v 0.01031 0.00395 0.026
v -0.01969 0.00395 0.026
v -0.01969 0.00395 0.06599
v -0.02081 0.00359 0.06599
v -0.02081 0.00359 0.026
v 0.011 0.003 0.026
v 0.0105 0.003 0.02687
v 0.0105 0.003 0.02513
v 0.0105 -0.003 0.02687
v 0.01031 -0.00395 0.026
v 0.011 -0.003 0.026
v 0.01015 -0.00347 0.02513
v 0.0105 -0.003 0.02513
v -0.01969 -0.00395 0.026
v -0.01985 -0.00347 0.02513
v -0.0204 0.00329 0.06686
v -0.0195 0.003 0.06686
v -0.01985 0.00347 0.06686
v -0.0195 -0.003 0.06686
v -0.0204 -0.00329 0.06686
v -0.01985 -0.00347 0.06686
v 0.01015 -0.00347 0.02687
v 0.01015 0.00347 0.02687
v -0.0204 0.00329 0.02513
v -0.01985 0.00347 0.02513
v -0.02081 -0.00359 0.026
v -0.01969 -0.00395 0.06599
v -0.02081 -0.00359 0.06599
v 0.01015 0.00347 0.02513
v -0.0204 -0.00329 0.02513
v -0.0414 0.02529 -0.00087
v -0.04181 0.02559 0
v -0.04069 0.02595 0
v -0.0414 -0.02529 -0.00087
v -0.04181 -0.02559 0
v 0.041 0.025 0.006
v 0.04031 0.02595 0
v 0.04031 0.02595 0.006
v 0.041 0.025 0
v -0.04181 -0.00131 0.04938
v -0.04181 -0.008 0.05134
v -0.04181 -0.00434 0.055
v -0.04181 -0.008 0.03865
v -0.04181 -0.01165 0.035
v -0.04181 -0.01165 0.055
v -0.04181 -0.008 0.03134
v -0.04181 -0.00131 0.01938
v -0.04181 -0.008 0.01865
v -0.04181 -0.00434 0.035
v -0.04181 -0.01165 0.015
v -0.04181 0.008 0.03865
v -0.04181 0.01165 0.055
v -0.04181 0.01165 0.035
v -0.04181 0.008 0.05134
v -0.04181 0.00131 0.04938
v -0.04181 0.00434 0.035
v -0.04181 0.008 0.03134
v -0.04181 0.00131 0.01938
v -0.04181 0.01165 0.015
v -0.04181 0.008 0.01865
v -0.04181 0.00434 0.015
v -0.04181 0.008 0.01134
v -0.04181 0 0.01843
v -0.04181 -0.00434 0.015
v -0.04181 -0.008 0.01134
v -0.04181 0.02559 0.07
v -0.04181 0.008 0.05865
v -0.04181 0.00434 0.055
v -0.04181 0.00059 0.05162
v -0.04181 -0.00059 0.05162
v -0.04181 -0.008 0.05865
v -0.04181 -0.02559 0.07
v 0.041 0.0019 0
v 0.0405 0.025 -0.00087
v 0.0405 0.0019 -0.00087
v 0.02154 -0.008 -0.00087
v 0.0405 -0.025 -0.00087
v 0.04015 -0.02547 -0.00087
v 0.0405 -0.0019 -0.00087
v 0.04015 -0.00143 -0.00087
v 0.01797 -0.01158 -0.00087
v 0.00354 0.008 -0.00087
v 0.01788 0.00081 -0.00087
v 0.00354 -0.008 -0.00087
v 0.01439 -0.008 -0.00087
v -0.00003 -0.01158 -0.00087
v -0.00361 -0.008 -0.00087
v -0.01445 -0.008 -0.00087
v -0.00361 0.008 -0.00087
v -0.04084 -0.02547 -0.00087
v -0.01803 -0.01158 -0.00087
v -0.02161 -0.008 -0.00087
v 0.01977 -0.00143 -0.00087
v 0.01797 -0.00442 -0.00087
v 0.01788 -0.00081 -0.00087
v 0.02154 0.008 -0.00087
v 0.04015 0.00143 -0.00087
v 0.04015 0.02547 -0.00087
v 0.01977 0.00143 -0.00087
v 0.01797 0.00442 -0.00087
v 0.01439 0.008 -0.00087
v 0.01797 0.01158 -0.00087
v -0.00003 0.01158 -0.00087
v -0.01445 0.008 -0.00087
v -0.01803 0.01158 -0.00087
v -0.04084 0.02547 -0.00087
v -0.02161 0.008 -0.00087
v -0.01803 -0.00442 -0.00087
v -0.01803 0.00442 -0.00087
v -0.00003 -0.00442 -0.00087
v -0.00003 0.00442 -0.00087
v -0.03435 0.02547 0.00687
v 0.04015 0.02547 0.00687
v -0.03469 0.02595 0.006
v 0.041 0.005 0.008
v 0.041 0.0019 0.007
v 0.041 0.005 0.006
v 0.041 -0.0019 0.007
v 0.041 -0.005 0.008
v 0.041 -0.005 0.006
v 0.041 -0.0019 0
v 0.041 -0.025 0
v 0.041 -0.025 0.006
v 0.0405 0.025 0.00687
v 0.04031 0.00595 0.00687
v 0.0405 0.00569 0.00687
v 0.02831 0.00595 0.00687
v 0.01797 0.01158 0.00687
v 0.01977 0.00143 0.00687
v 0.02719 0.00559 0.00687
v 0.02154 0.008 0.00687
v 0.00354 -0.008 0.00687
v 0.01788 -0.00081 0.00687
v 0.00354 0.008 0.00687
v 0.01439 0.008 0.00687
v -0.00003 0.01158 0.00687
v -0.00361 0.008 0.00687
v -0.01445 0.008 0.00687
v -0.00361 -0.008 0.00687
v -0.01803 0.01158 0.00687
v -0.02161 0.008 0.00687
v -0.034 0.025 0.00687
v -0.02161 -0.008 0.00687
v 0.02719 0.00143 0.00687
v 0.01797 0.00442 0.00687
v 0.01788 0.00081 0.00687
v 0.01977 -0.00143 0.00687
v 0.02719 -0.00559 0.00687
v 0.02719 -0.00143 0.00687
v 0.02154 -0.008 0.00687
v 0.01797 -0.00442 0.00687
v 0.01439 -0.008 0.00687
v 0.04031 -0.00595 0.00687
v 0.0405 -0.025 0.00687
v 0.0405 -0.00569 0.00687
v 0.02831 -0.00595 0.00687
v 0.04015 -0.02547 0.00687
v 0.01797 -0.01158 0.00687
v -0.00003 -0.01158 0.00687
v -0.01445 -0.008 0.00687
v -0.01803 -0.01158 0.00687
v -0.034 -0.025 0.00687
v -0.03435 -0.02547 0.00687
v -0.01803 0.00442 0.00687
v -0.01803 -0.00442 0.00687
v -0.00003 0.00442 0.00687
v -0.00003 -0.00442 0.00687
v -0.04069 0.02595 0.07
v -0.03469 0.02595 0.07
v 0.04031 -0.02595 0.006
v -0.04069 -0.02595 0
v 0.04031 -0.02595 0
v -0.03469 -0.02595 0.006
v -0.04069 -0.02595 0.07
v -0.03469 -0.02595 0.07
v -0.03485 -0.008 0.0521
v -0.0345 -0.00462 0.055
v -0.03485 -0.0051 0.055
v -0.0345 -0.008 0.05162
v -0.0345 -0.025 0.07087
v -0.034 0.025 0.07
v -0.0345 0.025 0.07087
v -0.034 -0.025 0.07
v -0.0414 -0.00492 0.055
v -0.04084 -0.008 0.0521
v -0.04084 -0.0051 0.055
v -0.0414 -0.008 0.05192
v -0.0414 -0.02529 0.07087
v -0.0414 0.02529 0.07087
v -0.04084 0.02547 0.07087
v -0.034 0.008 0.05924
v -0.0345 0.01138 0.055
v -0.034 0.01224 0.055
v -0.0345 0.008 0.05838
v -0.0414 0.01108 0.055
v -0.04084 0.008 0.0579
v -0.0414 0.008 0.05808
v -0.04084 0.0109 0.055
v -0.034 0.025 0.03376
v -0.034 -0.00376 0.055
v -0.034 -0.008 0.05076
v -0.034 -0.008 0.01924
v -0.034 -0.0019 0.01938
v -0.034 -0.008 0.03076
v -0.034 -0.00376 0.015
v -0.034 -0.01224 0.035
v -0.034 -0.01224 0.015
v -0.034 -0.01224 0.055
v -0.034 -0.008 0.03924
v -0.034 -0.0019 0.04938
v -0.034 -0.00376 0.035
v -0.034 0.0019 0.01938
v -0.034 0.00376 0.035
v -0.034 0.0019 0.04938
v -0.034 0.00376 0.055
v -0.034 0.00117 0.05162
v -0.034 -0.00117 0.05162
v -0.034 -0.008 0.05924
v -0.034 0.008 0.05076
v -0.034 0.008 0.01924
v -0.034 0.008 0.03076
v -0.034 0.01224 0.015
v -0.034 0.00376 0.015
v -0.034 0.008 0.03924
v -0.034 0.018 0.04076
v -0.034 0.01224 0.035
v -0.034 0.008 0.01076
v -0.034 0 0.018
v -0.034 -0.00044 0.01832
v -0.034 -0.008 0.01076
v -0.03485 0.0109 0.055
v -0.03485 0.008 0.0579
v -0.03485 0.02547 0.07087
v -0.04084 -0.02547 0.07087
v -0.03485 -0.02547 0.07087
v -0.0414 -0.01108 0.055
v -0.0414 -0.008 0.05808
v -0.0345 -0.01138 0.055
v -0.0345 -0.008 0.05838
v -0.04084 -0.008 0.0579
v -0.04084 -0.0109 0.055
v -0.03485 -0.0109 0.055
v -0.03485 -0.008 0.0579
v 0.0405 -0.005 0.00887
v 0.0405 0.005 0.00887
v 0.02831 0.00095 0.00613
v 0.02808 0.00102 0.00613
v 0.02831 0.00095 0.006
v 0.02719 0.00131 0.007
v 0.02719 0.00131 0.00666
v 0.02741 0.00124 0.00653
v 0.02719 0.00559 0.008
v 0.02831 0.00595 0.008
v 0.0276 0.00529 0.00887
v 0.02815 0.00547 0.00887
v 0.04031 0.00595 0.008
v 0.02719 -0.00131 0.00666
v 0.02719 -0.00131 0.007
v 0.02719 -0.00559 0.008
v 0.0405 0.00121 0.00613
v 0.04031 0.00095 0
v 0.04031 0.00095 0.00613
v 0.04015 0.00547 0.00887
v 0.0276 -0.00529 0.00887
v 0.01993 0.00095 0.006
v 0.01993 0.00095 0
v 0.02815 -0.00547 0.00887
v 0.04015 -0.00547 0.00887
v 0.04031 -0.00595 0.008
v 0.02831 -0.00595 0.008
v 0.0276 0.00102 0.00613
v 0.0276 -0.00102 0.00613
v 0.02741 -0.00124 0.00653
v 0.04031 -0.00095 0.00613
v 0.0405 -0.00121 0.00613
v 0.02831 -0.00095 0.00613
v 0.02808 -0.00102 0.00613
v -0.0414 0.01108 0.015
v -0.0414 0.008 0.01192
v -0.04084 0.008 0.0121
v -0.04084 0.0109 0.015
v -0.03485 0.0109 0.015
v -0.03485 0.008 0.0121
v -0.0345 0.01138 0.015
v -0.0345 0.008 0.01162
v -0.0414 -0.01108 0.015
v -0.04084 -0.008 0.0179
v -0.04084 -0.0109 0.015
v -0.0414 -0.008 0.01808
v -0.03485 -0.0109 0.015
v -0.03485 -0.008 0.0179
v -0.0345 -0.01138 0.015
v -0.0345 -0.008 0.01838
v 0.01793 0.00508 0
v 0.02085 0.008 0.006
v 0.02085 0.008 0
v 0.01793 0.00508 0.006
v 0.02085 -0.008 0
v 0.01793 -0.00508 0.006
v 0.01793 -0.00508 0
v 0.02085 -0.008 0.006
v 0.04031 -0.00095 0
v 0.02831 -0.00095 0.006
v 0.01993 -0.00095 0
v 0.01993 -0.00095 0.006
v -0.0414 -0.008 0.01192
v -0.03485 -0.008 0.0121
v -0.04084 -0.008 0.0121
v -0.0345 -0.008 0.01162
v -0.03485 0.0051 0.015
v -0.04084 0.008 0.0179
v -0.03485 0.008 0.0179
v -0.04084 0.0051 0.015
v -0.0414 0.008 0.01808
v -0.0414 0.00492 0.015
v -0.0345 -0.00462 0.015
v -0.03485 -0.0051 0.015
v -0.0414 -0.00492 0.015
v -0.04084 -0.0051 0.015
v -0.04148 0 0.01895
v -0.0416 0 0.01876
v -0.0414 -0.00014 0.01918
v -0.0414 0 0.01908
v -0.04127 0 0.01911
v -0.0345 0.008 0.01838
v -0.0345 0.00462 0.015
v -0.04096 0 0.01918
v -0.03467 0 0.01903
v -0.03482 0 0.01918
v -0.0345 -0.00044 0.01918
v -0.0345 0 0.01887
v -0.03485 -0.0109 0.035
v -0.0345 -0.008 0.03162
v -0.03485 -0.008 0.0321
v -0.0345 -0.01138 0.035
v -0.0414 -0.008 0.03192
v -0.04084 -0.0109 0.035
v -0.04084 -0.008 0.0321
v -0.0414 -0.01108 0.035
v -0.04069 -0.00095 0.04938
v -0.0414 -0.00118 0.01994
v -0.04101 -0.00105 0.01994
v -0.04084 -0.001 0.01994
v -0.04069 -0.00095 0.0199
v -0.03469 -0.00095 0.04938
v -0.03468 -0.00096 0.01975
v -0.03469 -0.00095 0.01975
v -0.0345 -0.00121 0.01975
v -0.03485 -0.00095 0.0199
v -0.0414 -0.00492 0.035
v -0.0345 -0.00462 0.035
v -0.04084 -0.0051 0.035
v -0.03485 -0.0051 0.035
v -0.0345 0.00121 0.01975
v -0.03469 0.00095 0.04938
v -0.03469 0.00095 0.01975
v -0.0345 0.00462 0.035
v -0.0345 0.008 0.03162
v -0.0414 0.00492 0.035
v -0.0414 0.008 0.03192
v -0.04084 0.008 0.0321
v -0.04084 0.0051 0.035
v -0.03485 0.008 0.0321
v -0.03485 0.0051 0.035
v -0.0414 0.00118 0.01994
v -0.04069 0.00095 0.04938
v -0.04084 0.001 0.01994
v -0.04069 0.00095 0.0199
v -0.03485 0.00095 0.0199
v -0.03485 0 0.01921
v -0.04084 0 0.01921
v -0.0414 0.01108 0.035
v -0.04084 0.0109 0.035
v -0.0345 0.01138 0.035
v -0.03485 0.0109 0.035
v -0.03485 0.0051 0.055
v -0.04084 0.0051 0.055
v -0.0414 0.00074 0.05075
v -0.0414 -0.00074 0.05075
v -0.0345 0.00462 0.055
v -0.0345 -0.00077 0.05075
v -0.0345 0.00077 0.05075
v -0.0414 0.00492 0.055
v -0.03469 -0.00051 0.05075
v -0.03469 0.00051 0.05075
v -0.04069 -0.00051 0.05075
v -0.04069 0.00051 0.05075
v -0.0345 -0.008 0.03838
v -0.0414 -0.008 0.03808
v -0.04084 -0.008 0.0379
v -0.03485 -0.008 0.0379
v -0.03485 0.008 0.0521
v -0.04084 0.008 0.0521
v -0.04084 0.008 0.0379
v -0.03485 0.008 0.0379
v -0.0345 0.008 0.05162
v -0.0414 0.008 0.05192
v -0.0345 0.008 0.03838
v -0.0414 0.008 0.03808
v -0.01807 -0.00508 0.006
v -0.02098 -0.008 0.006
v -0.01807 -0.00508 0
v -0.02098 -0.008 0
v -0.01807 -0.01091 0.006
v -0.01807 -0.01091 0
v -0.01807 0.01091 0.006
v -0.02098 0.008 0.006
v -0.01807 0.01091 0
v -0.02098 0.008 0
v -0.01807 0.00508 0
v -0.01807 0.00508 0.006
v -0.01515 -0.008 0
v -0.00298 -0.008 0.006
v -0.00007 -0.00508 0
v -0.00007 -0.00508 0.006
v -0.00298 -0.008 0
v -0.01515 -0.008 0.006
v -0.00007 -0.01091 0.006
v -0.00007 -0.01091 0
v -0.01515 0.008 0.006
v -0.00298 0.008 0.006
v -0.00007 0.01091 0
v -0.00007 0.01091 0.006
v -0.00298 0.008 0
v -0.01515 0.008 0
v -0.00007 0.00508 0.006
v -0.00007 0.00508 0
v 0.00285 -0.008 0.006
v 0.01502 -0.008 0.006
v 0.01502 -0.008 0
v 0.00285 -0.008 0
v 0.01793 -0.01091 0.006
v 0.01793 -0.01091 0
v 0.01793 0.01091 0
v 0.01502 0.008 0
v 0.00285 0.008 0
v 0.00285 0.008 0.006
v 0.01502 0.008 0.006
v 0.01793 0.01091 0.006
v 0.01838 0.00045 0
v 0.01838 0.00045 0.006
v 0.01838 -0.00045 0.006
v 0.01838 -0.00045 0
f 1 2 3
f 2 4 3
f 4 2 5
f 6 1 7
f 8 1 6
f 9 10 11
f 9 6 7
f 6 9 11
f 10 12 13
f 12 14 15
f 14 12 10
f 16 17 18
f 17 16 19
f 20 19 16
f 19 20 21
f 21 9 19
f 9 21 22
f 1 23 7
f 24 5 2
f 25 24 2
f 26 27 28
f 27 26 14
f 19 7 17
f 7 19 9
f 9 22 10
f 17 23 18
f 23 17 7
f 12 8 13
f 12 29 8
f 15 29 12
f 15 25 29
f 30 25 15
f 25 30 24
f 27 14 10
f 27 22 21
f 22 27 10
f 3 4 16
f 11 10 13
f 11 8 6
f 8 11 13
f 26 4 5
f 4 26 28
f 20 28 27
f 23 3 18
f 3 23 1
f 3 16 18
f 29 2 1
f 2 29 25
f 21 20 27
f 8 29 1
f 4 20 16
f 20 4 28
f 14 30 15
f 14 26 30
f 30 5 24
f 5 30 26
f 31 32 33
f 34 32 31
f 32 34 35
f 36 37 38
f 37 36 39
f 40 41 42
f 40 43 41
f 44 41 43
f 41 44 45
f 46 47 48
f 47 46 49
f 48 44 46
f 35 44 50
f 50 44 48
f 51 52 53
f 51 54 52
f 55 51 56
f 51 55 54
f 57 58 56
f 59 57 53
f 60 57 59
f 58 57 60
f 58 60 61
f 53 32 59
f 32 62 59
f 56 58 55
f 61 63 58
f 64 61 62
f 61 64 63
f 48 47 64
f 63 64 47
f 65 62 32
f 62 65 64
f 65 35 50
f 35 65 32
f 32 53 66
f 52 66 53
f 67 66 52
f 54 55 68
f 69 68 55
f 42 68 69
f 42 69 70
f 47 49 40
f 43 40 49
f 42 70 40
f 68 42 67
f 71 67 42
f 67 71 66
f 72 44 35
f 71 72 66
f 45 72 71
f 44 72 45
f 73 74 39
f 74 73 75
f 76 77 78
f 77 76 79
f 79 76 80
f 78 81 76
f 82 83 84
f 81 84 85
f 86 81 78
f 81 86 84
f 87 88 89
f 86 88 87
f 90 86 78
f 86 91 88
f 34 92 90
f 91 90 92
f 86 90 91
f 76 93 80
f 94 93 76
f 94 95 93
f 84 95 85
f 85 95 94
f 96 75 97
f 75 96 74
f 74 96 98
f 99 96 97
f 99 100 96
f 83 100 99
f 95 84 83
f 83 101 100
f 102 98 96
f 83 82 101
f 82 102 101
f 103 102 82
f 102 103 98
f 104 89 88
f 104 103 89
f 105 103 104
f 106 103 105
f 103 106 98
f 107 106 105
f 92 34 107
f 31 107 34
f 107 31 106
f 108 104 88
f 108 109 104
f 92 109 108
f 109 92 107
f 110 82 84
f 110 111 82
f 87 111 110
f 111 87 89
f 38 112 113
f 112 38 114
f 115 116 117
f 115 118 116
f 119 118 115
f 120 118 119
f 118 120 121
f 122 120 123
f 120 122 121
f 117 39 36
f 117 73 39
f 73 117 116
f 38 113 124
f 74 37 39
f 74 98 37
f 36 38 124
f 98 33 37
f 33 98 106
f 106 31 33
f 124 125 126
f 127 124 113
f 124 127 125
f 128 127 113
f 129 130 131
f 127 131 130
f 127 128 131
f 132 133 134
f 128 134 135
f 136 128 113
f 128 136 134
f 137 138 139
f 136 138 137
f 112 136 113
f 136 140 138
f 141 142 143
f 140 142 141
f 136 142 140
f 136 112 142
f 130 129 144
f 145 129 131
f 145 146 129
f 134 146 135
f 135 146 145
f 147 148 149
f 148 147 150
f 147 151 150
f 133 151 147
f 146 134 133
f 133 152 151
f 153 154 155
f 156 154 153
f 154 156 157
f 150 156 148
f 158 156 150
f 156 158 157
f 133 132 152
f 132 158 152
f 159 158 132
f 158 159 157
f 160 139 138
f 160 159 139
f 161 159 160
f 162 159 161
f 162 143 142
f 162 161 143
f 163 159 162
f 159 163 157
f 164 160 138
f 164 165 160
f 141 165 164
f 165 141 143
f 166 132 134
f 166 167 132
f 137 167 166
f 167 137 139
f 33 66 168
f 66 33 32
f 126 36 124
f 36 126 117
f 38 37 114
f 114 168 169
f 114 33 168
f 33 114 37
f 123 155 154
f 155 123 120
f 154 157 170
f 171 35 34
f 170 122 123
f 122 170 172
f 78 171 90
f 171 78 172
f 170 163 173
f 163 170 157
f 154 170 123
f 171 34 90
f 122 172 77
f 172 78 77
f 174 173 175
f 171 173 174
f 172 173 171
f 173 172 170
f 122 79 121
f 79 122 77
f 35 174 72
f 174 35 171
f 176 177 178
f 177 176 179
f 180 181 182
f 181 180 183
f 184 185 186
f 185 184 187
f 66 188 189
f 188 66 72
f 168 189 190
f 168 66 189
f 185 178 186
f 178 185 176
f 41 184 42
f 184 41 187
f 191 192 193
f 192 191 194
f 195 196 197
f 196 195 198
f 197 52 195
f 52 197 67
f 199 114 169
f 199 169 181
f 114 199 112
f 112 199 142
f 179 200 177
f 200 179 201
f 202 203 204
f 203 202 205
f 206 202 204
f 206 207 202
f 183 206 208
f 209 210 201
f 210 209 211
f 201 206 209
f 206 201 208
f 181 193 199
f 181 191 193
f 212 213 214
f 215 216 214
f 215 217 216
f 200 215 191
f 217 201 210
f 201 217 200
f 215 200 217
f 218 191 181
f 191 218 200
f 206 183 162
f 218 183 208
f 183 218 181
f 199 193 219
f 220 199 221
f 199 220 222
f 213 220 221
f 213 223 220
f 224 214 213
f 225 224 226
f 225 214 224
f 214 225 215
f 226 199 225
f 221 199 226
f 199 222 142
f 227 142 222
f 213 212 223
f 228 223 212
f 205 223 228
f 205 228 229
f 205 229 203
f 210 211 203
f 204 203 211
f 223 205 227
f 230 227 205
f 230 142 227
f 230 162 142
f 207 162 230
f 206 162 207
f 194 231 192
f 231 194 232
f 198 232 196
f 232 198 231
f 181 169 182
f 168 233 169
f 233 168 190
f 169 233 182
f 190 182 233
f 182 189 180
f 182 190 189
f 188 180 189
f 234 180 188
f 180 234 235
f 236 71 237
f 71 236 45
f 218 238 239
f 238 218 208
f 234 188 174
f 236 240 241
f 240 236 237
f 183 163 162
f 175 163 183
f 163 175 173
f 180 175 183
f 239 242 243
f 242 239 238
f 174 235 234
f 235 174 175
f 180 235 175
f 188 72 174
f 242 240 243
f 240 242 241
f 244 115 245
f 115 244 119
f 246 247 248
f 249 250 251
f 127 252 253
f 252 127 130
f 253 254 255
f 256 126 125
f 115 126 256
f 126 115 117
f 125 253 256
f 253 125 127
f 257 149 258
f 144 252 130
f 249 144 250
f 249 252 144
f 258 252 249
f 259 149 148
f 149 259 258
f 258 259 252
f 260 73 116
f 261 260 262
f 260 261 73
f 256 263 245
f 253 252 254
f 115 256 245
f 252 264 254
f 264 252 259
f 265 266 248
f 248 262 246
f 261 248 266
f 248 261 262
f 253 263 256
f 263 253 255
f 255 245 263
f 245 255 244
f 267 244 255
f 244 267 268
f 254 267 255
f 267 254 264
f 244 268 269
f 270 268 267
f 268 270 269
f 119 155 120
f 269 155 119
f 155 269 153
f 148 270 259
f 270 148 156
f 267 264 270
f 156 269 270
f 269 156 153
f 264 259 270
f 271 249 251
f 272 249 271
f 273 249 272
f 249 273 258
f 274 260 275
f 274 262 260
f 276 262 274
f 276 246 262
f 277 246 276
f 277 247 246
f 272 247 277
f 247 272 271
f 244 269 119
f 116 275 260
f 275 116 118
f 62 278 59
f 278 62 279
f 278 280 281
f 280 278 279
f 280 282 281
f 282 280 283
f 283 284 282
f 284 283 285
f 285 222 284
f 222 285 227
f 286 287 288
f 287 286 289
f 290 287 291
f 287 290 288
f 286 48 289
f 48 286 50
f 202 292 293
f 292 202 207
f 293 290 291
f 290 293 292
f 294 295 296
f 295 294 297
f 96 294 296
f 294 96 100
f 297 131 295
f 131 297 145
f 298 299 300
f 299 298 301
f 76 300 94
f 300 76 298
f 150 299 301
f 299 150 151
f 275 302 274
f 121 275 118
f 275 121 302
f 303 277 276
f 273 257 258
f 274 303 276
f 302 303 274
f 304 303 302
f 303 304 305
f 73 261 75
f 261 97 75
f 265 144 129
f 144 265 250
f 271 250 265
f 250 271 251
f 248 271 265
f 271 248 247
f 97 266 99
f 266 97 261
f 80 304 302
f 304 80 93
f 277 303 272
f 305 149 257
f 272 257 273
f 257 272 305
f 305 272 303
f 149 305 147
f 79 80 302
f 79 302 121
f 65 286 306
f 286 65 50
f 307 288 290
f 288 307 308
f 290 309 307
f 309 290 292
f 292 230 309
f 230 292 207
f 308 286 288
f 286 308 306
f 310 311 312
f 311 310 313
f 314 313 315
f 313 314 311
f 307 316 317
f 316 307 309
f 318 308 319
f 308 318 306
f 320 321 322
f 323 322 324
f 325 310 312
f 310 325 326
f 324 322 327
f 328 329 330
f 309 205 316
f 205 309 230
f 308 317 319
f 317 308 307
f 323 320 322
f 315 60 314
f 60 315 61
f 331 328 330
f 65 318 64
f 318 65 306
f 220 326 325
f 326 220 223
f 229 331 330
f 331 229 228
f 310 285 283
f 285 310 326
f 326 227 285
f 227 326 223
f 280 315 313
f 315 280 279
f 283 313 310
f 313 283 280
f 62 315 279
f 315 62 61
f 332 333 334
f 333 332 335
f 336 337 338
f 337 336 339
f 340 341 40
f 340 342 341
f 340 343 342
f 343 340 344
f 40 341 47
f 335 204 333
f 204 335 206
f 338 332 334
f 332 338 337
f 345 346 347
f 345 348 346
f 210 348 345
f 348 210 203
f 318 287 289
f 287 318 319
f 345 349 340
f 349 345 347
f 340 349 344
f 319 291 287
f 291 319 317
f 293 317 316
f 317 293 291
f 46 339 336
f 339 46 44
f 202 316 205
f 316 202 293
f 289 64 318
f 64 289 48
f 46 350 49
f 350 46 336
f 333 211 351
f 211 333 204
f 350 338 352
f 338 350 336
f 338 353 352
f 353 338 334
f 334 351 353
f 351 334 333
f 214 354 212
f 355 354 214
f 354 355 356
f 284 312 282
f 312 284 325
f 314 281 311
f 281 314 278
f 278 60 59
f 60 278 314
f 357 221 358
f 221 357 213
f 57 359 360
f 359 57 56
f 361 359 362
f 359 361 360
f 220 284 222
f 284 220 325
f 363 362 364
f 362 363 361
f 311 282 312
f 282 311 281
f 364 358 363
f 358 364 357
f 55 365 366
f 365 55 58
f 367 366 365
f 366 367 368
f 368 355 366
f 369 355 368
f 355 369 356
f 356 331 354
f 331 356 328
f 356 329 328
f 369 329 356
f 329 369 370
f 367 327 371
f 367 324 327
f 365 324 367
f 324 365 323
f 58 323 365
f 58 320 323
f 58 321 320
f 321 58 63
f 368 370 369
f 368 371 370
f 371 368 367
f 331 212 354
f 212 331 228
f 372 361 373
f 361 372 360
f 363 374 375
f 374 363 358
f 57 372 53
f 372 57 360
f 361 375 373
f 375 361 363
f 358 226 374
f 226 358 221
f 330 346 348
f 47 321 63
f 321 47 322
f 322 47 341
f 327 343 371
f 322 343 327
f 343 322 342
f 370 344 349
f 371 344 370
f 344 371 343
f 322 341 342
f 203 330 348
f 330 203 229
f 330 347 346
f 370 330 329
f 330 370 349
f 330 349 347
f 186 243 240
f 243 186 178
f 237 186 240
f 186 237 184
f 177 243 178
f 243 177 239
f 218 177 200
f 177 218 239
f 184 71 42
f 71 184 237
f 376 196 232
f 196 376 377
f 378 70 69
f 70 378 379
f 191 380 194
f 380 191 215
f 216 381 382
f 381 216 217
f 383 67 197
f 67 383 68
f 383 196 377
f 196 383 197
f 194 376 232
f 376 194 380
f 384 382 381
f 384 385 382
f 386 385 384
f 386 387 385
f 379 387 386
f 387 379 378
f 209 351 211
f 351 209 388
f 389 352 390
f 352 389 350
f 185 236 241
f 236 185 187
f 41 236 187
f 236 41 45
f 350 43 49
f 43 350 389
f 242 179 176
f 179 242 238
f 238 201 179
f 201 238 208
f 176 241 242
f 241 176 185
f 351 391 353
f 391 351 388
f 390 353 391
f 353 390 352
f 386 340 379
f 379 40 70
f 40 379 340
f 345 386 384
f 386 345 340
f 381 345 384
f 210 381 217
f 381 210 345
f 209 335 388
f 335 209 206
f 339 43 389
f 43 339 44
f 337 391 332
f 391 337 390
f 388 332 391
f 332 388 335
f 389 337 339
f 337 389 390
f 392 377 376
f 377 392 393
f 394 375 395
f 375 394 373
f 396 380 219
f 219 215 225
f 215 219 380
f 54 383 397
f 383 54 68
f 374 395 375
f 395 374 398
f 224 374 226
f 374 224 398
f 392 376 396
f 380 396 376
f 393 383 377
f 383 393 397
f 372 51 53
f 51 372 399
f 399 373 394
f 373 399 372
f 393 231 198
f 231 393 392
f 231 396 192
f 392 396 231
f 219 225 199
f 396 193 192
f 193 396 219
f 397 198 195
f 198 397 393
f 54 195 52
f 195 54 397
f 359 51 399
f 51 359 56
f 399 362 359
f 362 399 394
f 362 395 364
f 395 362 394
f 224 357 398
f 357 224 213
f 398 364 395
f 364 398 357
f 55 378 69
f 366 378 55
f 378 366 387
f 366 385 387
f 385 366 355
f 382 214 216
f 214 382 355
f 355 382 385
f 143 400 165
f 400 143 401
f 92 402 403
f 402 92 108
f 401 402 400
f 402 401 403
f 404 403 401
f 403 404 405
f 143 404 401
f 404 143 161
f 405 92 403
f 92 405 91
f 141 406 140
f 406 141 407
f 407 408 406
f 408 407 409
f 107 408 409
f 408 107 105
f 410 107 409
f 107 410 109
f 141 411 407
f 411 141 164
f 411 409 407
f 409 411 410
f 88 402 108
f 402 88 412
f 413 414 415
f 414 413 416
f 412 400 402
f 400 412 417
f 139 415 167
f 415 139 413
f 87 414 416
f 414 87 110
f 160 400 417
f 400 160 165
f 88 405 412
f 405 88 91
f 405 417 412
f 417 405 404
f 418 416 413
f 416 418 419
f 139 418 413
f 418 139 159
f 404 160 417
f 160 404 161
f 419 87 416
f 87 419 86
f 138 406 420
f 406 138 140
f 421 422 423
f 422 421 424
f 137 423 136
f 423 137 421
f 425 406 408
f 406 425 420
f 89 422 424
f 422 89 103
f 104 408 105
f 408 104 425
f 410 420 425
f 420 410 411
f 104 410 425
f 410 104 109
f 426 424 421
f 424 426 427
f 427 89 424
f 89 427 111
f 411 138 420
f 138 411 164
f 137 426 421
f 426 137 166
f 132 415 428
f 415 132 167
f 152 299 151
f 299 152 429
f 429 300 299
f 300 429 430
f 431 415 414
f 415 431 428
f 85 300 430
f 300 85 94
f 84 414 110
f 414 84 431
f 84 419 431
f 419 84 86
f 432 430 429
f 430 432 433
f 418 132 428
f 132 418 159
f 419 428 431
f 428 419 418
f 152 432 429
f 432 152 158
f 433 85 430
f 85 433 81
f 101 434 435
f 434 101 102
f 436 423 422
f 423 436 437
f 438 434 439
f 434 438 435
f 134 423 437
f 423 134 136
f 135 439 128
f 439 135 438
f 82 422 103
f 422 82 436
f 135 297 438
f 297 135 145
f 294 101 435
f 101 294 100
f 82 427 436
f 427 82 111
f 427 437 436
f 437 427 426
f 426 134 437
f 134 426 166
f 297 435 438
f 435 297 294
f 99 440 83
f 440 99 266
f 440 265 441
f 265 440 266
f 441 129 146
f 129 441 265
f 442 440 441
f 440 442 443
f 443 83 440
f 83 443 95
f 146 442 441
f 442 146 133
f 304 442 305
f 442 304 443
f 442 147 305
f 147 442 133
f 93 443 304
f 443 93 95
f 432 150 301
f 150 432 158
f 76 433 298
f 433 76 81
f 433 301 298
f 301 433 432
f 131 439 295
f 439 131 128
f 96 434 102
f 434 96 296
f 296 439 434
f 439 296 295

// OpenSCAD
// Parameters
bbox_X = 0.08; //[0.04:0.16:0.001]
bbox_Y = 0.05; //[0.025:0.1:0.001]
bbox_Z = 0.07; //[0.035:0.14:0.001]
plate_t = 0.006; //[0.003:0.012:0.001]
base_Lx = 0.08; //[0.04:0.16:0.001]
base_Wy = 0.05; //[0.025:0.1:0.001]
upright_Ly = 0.05; //[0.025:0.1:0.001]
upright_Hz = 0.07; //[0.035:0.14:0.001]
gusset_t = 0.006; //[0.003:0.012:0.001]
gusset_leg_x = 0.03; //[0.015:0.06:0.001]
gusset_leg_z = 0.04; //[0.02:0.08:0.001]
hole_sq = 0.006; //[0.003:0.012:0.001]
hole_rot_deg = 45; //[0:45:1]
base_hole_pitch_x = 0.018; //[0.009:0.036:0.001]
base_hole_pitch_y = 0.016; //[0.008:0.032:0.001]
base_hole_count_x = 3; //[1:6:1]
base_hole_count_y = 2; //[1:6:1]
upright_hole_pitch_y = 0.016; //[0.008:0.032:0.001]
upright_hole_pitch_z = 0.02; //[0.01:0.04:0.001]
upright_hole_count_y = 2; //[1:6:1]
upright_hole_count_z = 3; //[1:6:1]
slot_base_L = 0.03; //[0.015:0.06:0.001]
slot_base_W = 0.008; //[0.004:0.016:0.001]
slot_upright_L = 0.03; //[0.015:0.06:0.001]
slot_upright_W = 0.008; //[0.004:0.016:0.001]
slot_corner_r = 0.002; //[0.001:0.004:0.001]
overlap = 0.001; //[0.0005:0.002:0.0005]
tab_t = 0.003; //[0.0015:0.006:0.0005]
tab_L = 0.012; //[0.006:0.024:0.001]
tab_W = 0.01; //[0.005:0.02:0.001]
fillet_r = 0.001; //[0.0005:0.002:0.0005]

// Base Plate
module base_plate() {
  translate([0, 0, plate_t/2])
    cube([base_Lx, base_Wy, plate_t], center=true);
}

// Upright Plate
module upright_plate() {
  translate([-base_Lx/2 + plate_t/2 - overlap, 0, upright_Hz/2])
    cube([plate_t, upright_Ly, upright_Hz], center=true);
}

// Triangular Gusset
module triangular_gusset() {
  translate([-base_Lx/2 + plate_t - overlap + gusset_leg_x/2, 0, plate_t + gusset_leg_z/2])
    rotate([90, 0, 0])
      linear_extrude(height=gusset_t, center=true)
        polygon(points=[[0, 0], [gusset_leg_x, 0], [0, gusset_leg_z]]);
}

// Edge Tabs/Steps
module edge_tabs_steps() {
  translate([base_Lx/2 - tab_L/2, 0, plate_t + tab_t/2 - overlap])
    cube([tab_L, tab_W, tab_t], center=true);
}

// Diamond Hole
module diamond_hole() {
  rotate([0, 0, hole_rot_deg])
    cube([hole_sq, hole_sq, plate_t + 2*overlap], center=true);
}

// Base Diamond Hole Pattern
module base_diamond_hole_pattern() {
  union() {
    for (x = [-base_hole_pitch_x, 0, base_hole_pitch_x])
      for (y = [-base_hole_pitch_y/2, base_hole_pitch_y/2])
        translate([x, y, plate_t/2])
          diamond_hole();
  }
}

// Upright Diamond Hole Pattern
module upright_diamond_hole_pattern() {
  union() {
    for (y = [-upright_hole_pitch_y/2, upright_hole_pitch_y/2])
      for (z = [upright_Hz/2 - upright_hole_pitch_z, upright_Hz/2, upright_Hz/2 + upright_hole_pitch_z])
        translate([-base_Lx/2 + plate_t/2 - overlap, y, z])
          rotate([hole_rot_deg, 0, 0])
            cube([plate_t + 2*overlap, hole_sq, hole_sq], center=true);
  }
}

// Base Rectangular Slot
module base_rectangular_slot() {
  hull() {
    translate([base_Lx/2 - slot_base_L/2 - plate_t, 0, plate_t/2])
      cylinder(r=slot_corner_r, h=plate_t + 2*overlap, center=true);
    translate([base_Lx/2 + slot_base_L/2 - plate_t, 0, plate_t/2])
      cylinder(r=slot_corner_r, h=plate_t + 2*overlap, center=true);
  }
  scale([1, slot_base_W/(2*slot_corner_r), 1])
    children();
}

// Upright Rectangular Slot
module upright_rectangular_slot() {
  hull() {
    translate([-base_Lx/2 + plate_t/2 - overlap, 0, upright_Hz/2 - slot_upright_L/2])
      rotate([0, 90, 0])
        cylinder(r=slot_corner_r, h=plate_t + 2*overlap, center=true);
    translate([-base_Lx/2 + plate_t/2 - overlap, 0, upright_Hz/2 + slot_upright_L/2])
      rotate([0, 90, 0])
        cylinder(r=slot_corner_r, h=plate_t + 2*overlap, center=true);
  }
  scale([slot_upright_W/(2*slot_corner_r), 1, 1])
    children();
}

// Main Solid Union
module main_solid_union() {
  union() {
    base_plate();
    upright_plate();
    triangular_gusset();
    edge_tabs_steps();
  }
}

// All Cutouts Union
module all_cutouts_union() {
  union() {
    base_diamond_hole_pattern();
    upright_diamond_hole_pattern();
    base_rectangular_slot();
    upright_rectangular_slot();
  }
}

// Bracket with Holes and Slots
module bracket_with_holes_slots() {
  difference() {
    main_solid_union();
    all_cutouts_union();
  }
}

// Chamfers and Fillets
module chamfers_fillets() {
  minkowski() {
    bracket_with_holes_slots();
    sphere(r=fillet_r, center=true);
  }
}

// Final Output
chamfers_fillets();
